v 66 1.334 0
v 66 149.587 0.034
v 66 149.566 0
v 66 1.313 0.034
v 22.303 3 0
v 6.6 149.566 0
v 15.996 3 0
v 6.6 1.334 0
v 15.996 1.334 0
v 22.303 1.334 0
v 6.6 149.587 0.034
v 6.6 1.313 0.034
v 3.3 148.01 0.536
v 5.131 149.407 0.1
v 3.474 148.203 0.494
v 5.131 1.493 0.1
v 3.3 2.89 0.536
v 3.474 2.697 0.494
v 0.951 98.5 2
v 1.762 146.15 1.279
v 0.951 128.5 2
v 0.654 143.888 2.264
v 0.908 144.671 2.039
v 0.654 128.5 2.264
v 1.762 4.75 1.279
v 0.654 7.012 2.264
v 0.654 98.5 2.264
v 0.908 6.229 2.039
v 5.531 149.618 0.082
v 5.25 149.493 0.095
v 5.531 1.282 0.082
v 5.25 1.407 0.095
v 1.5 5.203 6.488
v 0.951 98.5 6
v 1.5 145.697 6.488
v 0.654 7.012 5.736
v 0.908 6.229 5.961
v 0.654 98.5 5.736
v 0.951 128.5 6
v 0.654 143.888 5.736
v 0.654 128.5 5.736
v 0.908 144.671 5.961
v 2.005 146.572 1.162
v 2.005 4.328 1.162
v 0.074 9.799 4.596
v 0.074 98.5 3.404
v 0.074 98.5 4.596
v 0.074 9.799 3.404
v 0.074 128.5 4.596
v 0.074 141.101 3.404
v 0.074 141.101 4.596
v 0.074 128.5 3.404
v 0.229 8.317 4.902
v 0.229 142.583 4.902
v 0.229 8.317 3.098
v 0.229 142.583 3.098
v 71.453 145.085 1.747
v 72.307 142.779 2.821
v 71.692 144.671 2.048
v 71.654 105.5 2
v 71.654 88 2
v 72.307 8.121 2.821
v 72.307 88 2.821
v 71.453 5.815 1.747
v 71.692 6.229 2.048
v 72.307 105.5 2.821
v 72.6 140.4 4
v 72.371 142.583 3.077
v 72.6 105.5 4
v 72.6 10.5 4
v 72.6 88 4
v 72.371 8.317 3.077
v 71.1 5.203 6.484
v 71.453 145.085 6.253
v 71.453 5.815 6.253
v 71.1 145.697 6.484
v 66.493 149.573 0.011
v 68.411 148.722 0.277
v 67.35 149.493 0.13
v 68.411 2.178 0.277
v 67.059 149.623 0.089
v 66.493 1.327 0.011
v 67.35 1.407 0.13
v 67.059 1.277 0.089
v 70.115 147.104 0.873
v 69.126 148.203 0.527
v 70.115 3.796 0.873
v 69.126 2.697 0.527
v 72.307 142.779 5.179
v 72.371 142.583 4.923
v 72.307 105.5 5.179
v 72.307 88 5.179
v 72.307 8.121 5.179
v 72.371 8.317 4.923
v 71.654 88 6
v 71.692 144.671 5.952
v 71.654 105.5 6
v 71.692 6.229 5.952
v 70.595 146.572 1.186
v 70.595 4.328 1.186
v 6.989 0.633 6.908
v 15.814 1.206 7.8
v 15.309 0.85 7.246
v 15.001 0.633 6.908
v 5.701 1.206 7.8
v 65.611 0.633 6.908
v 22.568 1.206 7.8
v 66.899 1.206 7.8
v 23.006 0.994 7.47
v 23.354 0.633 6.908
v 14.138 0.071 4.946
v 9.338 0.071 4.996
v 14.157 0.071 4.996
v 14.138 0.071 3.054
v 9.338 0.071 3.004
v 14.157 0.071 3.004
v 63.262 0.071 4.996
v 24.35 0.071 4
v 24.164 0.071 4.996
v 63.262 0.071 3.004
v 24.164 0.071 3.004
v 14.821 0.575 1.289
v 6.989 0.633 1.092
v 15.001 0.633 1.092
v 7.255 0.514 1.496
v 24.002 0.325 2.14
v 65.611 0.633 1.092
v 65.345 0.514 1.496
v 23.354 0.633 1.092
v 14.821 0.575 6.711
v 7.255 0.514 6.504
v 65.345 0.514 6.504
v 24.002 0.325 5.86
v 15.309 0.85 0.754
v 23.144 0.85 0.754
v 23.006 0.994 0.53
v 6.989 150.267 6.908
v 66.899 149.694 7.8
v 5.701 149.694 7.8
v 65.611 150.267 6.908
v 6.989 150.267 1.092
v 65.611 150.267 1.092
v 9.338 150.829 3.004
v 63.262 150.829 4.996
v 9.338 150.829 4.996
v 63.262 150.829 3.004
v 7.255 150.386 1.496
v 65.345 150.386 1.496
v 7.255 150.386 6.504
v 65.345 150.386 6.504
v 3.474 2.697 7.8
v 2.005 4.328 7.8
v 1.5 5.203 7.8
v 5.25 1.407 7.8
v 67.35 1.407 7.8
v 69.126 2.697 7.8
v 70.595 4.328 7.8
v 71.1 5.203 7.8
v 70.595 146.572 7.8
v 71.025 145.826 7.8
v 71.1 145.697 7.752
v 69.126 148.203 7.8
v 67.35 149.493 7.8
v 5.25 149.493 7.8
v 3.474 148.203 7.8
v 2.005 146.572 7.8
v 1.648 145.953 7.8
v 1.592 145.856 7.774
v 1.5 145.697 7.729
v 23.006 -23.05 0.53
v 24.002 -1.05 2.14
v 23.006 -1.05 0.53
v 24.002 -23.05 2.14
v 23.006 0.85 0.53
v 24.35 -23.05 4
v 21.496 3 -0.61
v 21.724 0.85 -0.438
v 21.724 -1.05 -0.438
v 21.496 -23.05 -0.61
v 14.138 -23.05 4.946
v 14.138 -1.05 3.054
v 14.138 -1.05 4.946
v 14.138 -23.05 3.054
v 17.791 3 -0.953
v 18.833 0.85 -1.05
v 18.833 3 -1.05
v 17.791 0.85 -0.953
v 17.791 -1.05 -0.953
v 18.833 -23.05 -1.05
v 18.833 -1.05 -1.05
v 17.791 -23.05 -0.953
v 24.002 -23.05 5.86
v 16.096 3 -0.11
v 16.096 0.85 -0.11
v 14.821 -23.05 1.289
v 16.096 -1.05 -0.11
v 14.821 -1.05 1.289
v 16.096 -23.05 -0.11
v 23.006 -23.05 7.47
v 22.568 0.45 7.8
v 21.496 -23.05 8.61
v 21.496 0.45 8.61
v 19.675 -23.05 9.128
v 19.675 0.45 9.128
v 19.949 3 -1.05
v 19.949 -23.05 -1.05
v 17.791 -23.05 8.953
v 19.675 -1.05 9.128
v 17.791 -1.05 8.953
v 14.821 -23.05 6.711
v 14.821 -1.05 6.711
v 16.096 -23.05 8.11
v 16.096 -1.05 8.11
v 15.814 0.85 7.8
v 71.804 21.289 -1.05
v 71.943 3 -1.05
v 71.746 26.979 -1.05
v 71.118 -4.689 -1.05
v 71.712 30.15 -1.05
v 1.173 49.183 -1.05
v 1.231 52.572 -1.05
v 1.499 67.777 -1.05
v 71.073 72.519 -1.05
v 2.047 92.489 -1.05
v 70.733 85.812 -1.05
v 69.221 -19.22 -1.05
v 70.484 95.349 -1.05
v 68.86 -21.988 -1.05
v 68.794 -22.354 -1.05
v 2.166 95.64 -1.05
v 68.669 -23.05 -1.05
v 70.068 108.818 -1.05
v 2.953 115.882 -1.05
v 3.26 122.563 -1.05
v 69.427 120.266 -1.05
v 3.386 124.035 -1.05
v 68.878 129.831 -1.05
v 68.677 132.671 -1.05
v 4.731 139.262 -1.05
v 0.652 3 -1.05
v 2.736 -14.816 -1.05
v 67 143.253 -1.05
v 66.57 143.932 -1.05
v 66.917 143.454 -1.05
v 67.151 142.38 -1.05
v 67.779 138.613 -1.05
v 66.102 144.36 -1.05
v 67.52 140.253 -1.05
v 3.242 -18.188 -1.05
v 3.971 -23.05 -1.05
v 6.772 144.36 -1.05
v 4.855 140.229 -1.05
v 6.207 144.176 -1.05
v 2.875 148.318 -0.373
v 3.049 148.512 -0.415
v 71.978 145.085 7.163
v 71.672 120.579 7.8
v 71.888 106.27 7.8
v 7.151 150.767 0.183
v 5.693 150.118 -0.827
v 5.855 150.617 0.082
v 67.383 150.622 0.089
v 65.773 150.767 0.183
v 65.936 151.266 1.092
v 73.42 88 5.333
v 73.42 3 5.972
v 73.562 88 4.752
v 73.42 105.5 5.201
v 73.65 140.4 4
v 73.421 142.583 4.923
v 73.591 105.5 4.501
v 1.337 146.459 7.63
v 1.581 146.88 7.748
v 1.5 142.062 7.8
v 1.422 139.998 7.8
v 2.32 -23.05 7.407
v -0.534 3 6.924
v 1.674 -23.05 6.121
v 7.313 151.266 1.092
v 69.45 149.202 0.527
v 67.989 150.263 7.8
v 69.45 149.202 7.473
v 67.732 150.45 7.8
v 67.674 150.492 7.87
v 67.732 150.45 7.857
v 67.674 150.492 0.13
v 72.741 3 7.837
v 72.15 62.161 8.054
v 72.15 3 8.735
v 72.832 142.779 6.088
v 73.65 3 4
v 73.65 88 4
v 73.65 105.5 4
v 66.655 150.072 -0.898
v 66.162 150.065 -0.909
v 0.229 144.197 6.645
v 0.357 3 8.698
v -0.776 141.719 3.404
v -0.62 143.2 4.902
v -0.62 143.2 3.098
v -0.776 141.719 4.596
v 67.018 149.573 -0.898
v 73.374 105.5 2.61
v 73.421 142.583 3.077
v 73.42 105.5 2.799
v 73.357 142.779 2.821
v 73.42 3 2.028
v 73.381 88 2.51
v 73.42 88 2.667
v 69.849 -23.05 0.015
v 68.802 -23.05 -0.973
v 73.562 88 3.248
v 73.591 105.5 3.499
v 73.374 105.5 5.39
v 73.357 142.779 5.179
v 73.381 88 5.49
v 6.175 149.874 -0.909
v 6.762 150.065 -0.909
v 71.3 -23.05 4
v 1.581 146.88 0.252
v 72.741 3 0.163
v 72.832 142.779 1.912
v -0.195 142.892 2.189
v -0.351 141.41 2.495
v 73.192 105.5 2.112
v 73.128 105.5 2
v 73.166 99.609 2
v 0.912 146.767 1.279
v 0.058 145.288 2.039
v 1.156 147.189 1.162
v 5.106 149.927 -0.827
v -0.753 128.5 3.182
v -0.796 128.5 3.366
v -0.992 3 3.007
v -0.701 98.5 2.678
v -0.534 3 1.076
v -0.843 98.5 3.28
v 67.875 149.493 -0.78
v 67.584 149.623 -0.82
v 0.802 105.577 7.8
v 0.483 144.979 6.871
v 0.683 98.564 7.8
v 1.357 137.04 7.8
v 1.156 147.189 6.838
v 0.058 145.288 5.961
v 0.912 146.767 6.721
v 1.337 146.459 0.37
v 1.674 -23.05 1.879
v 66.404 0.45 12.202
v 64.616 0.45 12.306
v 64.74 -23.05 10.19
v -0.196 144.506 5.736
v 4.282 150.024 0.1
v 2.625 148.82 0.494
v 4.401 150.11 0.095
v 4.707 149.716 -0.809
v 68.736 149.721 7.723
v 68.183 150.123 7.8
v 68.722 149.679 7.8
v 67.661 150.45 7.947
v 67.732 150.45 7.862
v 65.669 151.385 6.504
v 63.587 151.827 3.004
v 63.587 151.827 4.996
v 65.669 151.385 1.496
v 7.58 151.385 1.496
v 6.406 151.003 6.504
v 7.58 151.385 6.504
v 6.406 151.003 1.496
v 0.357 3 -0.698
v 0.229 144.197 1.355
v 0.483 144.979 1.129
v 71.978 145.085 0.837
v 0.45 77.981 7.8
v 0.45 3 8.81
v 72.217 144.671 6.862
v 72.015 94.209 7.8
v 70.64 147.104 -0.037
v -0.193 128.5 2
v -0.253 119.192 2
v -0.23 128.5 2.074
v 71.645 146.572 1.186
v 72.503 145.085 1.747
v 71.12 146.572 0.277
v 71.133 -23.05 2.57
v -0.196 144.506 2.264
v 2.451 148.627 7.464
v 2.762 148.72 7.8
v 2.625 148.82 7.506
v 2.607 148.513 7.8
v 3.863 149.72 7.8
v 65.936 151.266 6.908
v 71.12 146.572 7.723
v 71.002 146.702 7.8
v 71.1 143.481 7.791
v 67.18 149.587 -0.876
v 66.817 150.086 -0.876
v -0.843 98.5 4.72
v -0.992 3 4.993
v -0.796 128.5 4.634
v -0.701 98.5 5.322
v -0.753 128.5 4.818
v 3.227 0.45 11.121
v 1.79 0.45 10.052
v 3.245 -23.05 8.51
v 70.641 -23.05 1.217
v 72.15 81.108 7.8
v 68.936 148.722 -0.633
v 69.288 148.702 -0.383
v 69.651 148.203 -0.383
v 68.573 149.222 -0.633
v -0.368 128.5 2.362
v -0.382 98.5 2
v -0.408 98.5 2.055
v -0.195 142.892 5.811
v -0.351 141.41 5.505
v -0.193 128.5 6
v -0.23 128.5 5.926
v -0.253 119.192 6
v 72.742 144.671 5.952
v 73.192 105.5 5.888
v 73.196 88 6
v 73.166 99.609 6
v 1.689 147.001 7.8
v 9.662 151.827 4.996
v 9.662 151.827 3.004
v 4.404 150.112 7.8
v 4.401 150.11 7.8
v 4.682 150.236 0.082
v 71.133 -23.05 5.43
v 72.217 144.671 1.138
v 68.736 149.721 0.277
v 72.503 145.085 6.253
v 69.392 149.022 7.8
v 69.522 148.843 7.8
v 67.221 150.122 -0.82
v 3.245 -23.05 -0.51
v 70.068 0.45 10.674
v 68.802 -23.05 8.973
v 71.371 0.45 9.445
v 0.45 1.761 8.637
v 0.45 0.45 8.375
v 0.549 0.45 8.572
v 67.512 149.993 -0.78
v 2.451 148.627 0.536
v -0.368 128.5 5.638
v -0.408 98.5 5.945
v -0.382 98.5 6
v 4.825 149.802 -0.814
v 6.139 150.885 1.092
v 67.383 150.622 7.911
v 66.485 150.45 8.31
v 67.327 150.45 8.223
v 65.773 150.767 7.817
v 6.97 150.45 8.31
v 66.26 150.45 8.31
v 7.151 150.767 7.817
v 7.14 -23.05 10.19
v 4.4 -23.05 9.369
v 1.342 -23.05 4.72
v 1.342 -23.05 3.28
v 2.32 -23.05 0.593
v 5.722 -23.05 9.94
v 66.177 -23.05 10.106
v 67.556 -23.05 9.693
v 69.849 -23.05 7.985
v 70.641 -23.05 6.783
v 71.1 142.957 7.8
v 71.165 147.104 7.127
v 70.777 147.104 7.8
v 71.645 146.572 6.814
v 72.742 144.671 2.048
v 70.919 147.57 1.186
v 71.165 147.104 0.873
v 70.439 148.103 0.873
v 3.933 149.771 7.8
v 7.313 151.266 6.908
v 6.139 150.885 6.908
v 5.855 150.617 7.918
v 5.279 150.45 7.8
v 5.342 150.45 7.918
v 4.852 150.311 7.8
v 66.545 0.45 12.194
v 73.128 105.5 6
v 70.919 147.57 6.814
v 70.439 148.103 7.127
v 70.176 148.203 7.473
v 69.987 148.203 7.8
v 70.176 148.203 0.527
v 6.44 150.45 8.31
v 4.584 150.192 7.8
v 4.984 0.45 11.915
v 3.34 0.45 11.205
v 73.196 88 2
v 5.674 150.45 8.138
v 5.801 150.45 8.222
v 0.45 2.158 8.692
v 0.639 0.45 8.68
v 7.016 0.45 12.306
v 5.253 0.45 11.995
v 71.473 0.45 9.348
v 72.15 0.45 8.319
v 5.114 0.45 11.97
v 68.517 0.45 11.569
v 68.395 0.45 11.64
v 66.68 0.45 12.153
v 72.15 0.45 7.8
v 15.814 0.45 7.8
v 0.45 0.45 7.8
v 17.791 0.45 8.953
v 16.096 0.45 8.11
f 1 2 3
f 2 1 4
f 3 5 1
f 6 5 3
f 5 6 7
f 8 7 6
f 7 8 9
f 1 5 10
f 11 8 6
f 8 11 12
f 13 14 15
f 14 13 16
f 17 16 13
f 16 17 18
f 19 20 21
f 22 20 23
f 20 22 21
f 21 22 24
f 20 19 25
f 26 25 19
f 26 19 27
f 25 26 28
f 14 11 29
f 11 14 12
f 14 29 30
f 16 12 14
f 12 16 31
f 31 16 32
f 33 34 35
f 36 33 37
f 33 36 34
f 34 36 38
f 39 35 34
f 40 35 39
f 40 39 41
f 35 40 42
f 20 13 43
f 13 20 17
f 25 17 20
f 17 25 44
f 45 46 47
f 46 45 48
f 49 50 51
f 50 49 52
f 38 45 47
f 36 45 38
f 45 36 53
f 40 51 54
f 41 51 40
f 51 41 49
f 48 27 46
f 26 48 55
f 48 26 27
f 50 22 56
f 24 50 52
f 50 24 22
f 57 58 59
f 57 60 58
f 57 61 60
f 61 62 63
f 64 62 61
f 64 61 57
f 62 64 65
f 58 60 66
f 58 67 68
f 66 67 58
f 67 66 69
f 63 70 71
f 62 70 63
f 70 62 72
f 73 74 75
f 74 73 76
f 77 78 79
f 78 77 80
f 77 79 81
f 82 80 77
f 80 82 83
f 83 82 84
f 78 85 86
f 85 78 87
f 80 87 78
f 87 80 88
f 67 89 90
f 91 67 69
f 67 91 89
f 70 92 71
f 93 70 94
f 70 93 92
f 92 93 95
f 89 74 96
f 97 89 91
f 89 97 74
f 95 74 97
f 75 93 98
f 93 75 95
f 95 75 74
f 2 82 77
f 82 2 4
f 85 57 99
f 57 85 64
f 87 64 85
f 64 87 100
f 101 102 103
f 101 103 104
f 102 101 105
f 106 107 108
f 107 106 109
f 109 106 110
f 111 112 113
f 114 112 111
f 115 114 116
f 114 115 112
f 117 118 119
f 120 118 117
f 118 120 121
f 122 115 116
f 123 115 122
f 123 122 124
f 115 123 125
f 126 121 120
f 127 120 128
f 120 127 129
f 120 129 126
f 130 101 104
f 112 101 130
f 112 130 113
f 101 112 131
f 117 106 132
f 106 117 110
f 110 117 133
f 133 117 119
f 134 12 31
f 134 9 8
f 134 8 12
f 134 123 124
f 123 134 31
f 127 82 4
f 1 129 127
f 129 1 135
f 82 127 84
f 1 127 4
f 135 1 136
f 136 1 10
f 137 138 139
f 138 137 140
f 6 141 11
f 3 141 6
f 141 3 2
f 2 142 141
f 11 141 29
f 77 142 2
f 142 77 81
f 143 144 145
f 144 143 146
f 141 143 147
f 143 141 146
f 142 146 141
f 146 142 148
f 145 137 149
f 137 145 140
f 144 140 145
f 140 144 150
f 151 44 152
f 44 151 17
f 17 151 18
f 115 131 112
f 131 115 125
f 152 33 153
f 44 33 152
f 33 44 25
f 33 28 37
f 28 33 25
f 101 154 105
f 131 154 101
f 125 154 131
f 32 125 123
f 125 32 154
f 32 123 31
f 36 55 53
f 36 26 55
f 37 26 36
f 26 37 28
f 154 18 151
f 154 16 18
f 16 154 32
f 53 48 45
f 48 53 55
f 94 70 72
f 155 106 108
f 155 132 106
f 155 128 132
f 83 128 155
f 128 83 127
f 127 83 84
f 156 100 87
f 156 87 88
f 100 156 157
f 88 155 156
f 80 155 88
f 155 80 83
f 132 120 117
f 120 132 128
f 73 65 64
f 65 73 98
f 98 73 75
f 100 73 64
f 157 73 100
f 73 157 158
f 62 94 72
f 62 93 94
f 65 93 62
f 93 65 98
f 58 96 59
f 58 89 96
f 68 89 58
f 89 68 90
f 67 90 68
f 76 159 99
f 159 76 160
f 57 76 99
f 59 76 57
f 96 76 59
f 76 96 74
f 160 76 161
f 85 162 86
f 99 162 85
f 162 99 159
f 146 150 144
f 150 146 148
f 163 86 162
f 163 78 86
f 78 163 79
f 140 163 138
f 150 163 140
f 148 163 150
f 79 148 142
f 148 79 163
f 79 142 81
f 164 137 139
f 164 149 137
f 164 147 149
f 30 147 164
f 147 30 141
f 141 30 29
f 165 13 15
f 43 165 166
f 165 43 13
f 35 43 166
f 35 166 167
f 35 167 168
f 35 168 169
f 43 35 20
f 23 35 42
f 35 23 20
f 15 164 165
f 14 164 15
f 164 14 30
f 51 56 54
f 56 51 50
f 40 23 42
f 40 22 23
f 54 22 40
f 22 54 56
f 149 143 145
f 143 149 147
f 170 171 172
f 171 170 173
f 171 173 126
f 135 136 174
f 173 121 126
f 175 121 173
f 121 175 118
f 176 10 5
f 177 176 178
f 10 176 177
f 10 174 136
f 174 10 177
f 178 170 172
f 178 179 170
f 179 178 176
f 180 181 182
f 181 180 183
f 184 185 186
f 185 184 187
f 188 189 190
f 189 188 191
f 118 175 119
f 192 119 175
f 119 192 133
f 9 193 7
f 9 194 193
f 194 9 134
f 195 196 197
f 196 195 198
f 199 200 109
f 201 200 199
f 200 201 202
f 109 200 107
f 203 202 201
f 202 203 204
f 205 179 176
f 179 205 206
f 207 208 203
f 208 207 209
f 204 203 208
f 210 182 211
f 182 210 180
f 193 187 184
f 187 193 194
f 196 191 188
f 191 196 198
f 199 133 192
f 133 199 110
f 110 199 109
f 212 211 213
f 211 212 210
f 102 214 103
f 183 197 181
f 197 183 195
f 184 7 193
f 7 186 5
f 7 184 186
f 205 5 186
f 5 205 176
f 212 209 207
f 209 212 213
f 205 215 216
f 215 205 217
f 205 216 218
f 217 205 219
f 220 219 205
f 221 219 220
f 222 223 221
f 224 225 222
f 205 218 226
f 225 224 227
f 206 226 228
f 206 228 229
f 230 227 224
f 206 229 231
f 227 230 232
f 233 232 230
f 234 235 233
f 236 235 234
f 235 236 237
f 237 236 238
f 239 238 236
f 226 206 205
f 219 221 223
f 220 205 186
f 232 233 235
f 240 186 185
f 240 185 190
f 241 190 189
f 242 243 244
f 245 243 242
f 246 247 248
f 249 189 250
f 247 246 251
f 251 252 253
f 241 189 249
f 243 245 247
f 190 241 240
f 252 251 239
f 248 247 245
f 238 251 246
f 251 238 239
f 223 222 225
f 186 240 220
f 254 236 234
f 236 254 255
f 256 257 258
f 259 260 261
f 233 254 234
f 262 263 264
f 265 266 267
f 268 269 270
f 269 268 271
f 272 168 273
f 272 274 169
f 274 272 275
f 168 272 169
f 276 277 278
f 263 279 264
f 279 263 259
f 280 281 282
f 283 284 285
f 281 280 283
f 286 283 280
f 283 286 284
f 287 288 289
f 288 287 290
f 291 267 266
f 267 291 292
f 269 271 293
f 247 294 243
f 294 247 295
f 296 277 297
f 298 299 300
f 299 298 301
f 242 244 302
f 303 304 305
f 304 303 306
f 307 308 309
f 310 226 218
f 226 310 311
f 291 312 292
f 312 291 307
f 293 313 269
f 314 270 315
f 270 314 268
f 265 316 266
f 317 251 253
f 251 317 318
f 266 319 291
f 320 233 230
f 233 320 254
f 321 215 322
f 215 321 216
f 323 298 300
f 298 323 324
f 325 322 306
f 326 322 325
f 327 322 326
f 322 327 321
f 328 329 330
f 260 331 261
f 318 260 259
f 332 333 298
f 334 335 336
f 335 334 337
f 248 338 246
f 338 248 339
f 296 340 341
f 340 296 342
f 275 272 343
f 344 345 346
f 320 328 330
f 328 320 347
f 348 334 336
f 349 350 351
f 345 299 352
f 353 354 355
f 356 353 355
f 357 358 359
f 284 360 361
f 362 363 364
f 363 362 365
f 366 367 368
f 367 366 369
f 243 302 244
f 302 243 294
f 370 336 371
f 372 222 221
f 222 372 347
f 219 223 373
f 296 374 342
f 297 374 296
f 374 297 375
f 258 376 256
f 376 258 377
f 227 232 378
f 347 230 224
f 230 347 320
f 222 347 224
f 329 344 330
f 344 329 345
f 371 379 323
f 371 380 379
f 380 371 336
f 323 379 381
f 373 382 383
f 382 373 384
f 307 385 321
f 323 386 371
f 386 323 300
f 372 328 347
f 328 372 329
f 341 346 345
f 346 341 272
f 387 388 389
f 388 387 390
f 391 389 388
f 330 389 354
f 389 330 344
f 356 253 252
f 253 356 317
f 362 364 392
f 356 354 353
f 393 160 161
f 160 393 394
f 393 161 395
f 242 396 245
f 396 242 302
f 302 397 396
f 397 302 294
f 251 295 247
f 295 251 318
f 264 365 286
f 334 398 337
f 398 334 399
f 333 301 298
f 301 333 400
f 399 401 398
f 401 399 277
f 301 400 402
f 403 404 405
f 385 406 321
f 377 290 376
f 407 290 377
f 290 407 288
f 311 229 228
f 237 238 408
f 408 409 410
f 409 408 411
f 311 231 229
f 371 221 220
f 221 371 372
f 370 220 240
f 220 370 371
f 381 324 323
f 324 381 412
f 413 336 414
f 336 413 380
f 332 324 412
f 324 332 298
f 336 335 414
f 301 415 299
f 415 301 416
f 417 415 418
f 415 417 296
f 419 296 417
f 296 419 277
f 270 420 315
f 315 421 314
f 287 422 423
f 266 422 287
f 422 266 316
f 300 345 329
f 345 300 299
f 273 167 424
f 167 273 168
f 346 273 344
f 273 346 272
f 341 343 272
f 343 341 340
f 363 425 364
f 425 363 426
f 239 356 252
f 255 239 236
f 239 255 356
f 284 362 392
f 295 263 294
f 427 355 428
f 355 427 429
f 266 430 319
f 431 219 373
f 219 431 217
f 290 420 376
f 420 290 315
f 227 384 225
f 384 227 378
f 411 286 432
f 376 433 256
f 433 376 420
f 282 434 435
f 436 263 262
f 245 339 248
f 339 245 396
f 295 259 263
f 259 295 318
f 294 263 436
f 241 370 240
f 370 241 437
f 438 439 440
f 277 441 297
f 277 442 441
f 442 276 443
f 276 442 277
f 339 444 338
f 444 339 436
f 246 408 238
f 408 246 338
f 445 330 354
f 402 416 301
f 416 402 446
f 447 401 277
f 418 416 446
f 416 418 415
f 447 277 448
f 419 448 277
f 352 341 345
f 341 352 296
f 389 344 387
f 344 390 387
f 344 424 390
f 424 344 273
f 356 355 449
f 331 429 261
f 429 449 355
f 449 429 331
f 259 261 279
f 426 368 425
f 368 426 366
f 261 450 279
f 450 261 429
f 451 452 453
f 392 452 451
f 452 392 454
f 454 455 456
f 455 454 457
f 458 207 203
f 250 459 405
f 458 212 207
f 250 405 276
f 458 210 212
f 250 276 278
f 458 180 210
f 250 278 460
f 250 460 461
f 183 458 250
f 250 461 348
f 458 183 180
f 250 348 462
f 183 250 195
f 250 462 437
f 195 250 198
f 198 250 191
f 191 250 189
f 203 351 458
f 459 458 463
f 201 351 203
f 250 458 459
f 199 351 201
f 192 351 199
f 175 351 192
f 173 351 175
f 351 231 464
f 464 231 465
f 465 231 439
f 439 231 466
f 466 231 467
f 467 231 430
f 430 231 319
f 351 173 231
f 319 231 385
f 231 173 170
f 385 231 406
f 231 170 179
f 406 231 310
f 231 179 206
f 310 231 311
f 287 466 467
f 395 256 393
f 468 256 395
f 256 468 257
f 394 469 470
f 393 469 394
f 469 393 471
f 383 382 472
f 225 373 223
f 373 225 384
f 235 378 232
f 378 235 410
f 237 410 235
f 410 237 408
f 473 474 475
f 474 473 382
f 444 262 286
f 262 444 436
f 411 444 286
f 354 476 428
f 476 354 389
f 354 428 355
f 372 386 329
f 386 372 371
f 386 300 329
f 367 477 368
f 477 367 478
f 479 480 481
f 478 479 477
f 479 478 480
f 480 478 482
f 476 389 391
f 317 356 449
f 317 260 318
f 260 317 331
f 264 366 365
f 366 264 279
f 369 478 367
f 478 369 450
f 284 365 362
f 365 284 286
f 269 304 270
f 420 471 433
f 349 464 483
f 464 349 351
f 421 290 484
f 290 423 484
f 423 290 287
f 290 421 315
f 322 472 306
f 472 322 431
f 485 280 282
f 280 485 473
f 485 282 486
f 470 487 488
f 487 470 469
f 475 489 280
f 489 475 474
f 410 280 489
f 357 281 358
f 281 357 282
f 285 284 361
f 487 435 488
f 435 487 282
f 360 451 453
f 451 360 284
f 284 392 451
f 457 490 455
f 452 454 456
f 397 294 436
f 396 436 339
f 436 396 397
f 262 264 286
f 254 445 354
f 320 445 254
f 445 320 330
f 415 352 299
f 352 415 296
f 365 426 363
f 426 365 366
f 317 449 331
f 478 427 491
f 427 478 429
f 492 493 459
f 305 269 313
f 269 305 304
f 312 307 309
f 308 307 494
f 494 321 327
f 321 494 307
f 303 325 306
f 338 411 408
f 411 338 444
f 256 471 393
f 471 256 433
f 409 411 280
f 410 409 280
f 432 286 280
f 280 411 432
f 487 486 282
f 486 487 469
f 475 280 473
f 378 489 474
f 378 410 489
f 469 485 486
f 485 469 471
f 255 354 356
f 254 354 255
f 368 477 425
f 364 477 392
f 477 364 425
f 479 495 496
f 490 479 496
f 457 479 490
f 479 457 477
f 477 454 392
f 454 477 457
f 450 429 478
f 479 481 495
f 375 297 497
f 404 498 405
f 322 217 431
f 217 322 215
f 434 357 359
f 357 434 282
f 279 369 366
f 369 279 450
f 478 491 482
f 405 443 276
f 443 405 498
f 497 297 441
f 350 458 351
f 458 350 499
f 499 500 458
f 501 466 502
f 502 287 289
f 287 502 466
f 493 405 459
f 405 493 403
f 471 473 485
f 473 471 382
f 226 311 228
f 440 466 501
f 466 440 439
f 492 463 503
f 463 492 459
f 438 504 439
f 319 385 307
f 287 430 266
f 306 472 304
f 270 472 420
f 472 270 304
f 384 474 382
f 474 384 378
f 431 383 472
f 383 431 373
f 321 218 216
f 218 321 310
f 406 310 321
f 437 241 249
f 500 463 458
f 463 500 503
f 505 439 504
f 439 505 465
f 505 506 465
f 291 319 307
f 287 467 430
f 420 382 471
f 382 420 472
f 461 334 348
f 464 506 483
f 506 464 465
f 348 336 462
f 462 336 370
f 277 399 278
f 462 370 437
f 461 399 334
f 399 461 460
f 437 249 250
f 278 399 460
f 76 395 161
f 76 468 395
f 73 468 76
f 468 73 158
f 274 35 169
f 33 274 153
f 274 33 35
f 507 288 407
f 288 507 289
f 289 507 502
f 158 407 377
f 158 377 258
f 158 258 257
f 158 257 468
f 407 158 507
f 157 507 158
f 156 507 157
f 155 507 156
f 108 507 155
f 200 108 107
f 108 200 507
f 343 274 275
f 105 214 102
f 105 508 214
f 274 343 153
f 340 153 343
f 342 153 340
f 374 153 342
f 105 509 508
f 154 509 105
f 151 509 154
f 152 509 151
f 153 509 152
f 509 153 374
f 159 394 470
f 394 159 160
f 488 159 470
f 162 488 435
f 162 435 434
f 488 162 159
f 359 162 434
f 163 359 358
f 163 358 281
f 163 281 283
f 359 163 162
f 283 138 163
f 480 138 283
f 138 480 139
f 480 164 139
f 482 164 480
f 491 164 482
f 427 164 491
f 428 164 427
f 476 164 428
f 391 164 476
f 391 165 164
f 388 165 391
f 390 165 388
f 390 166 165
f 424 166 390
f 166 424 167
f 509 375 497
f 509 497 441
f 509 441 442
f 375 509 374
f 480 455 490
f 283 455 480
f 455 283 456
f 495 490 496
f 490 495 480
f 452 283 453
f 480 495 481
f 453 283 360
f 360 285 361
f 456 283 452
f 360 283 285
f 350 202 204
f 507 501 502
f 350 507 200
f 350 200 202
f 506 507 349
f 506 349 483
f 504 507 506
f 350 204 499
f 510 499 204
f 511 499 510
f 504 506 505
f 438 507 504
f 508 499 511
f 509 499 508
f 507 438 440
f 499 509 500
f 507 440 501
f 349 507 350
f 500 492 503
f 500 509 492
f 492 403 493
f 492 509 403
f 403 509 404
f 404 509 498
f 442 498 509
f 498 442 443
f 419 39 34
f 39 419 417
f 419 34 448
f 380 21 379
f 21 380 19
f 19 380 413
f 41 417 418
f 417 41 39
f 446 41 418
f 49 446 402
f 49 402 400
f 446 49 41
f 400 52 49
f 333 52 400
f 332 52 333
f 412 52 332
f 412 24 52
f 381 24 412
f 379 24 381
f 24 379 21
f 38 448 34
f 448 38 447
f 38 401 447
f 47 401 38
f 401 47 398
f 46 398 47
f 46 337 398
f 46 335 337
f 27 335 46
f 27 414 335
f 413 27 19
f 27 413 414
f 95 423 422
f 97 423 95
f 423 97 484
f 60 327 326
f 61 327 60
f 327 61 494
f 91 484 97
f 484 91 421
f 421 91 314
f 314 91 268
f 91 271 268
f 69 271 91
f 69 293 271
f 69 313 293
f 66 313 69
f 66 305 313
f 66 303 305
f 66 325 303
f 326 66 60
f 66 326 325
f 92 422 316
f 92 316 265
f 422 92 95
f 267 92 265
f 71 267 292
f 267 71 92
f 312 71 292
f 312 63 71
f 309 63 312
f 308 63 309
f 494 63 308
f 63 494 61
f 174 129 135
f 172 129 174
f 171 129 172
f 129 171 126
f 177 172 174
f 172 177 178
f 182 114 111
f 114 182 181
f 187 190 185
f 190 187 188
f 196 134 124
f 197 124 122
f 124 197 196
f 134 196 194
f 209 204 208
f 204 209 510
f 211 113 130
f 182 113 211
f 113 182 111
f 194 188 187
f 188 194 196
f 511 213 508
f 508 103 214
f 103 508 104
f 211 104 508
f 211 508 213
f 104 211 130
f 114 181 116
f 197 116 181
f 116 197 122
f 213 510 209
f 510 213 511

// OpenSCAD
//My phone cover and reinforcement for the headphone jack.

//Measurements of Samsung Galaxy 7 Edge
phone_width = 72.6;
phone_height = 150.9;
phone_depth = 8.0;

phone_roundness_h = 6.6; //How far in the X direction the roundness extends over the screen.
phone_roundness_v_radius = 7.0; //The vertical roundness is not exactly round. Eccentricity!
phone_roundness_corner = 10.5; //Radius of the four rounded corners.

button_volumes_y = 98.5;
button_volumes_height = 30.0;
button_volumes_depth = 4.0;
button_power_y = 88.0;
button_power_height = 17.5;
button_power_depth = 4.0;

jack_x = 19.2; //Position of centre!
jack_width = 10.3;
jack_sleeve_diameter = 10.3; //Allow 0.3mm more for inaccuracy in printing.
jack_sleeve_length = 22.0; //How long the tube for the jack is.

//Settings
thickness = 1.05; //Align to line width for best print results.
undercut = 0.2; //How far below the phone's surface the mesh will stay.
max_overhang = 1.5; //How much the lip of the cover is allowed to overhang (barring undercut).
jack_sleeve_overhang = 3; //How far the sleeve covers the phone. Needs to be at least so that it covers the v_radius component!
jack_sleeve_diameter2 = 15; //Make it thicker at the base for strength.
jack_sleeve_endstop_length = 3; //Make the sleeve slope back down to disappear in the object.

//Implementation.
module body() {
	intersection() {
		union() { //Main body with rounded corners left and right.
			translate([phone_roundness_h, 0, 0]) {
				cube([phone_width - phone_roundness_h * 2, phone_height, phone_depth]);
			}
			translate([phone_roundness_h, 0, phone_depth / 2]) {
				scale([1, 1, (phone_depth / 2) / phone_roundness_h]) {
					rotate([-90, 0, 0]) {
						cylinder(r=phone_roundness_h, h=phone_height);
					}
				}
			}
			translate([phone_width - phone_roundness_h, 0, phone_depth / 2]) {
				scale([1, 1, (phone_depth / 2) / phone_roundness_h]) {
					rotate([-90, 0, 0]) {
						cylinder(r=phone_roundness_h, h=phone_height);
					}
				}
			}
		}
		union() { //Filter to cause vertical roundness.
			translate([0, phone_roundness_v_radius, phone_depth / 2]) {
				rotate([0, 90, 0]) {
					cylinder(r=phone_roundness_v_radius, h=phone_width);
				}
			}
			translate([0, phone_height - phone_roundness_v_radius, phone_depth / 2]) {
				rotate([0, 90, 0]) {
					cylinder(r=phone_roundness_v_radius, h=phone_width);
				}
			}
			translate([0, phone_roundness_v_radius, phone_depth / 2 - phone_roundness_v_radius]) {
				cube([phone_width, phone_height - phone_roundness_v_radius * 2, phone_roundness_v_radius * 2]);
			}
		}
		union() { //Filter to cause four rounded corners.
			translate([phone_roundness_corner, phone_roundness_corner, 0]) {
				cylinder(r=phone_roundness_corner, h=phone_depth);
			}
			translate([phone_width - phone_roundness_corner, phone_roundness_corner, 0]) {
				cylinder(r=phone_roundness_corner, h=phone_depth);
			}
			translate([phone_width - phone_roundness_corner, phone_height - phone_roundness_corner, 0]) {
				cylinder(r=phone_roundness_corner, h=phone_depth);
			}
			translate([phone_roundness_corner, phone_height - phone_roundness_corner, 0]) {
				cylinder(r=phone_roundness_corner, h=phone_depth);
			}
			translate([phone_roundness_corner, 0, 0]) {
				cube([phone_width - phone_roundness_corner * 2, phone_height, phone_depth]);
			}
			translate([0, phone_roundness_corner, 0]) {
				cube([phone_width, phone_height - phone_roundness_corner * 2, phone_depth]);
			}
		}
	}
}

//Render the main shell.
difference() {
	difference() {
		hull() {
			minkowski() {
				body();
				sphere(r=thickness);
			}

			//Bottom side bump.
			translate([jack_sleeve_diameter2 / 2, -thickness - jack_sleeve_length, phone_depth / 2]) {
				rotate([-90, 0, 0]) {
					cylinder(r1=jack_sleeve_diameter / 2 + thickness, r2=jack_sleeve_diameter2 / 2 + thickness, h=jack_sleeve_length + jack_sleeve_overhang + thickness);
					translate([0, 0, jack_sleeve_length + jack_sleeve_overhang + thickness]) {
						cylinder(r1=jack_sleeve_diameter2 / 2 + thickness, r2=phone_depth / 2, h=jack_sleeve_endstop_length);
					}
				}
			}
			translate([phone_width - jack_sleeve_diameter2 / 2, -thickness - jack_sleeve_length, phone_depth / 2]) {
				rotate([-90, 0, 0]) {
					cylinder(r1=jack_sleeve_diameter / 2 + thickness, r2=jack_sleeve_diameter2 / 2 + thickness, h=jack_sleeve_length + jack_sleeve_overhang + thickness);
					translate([0, 0, jack_sleeve_length + jack_sleeve_overhang + thickness]) {
						cylinder(r1=jack_sleeve_diameter2 / 2 + thickness, r2=phone_depth / 2, h=jack_sleeve_endstop_length);
					}
				}
			}
		}
		translate([jack_x, -thickness - jack_sleeve_length, phone_depth / 2]) {
			rotate([-90, 0, 0]) {
				cylinder(r=jack_sleeve_diameter / 2, h=jack_sleeve_length + jack_sleeve_overhang + thickness);
				translate([-jack_sleeve_diameter2 / 2 - thickness, phone_depth / 2 + thickness, 0]) {
					cube([jack_sleeve_diameter2, jack_sleeve_diameter2, jack_sleeve_length + jack_sleeve_endstop_length * 2 + thickness]);
				}
			}
		}
	}
	body(); //Hollow out!

	//Remove top cover.
	inset = min(sqrt(1 - pow((phone_depth / 2 - undercut) / phone_roundness_v_radius, 2)) * phone_roundness_v_radius / (phone_depth / 2 - undercut), max_overhang); //cos(sin-1(h)) = sqrt(1 - h^2)
	translate([-thickness + inset, -thickness + inset, phone_depth - undercut]) {
		cube([phone_width + thickness * 2 - inset * 2, phone_height + thickness * 2 - inset * 2, jack_sleeve_diameter2]);
	}

	//Apply maximum overhang.
	intersection() {
		union() {
			translate([phone_roundness_corner, phone_roundness_corner, phone_depth / 2]) {
				cylinder(r=phone_roundness_corner, h=phone_depth / 2);
			}
			translate([phone_width - phone_roundness_corner, phone_roundness_corner, phone_depth / 2]) {
				cylinder(r=phone_roundness_corner, h=phone_depth / 2);
			}
			translate([phone_width - phone_roundness_corner, phone_height - phone_roundness_corner, phone_depth / 2]) {
				cylinder(r=phone_roundness_corner, h=phone_depth / 2);
			}
			translate([phone_roundness_corner, phone_height - phone_roundness_corner, phone_depth / 2]) {
				cylinder(r=phone_roundness_corner, h=phone_depth / 2);
			}
			translate([phone_roundness_corner, 0, phone_depth / 2]) {
				cube([phone_width - phone_roundness_corner * 2, phone_height, phone_depth / 2]);
			}
			translate([0, phone_roundness_corner, phone_depth / 2]) {
				cube([phone_width, phone_height - phone_roundness_corner * 2, phone_depth / 2]);
			}
		}
		translate([max_overhang, max_overhang, phone_depth / 2]) {
			cube([phone_width - max_overhang * 2, phone_height - max_overhang * 2, phone_depth / 2]);
		}
	}

	//Subtract holes for buttons, peripherals, etc.
	//Volume buttons.
	translate([-thickness, button_volumes_y, phone_depth / 2 - button_volumes_depth / 2]) {
		cube([thickness + phone_roundness_h, button_volumes_height, button_volumes_depth]);
	}
	//Power button.
	translate([phone_width - phone_roundness_h, button_power_y, phone_depth / 2 - button_power_depth / 2]) {
		cube([thickness + phone_roundness_h, button_power_height, button_power_depth]);
	}
	//Audio jack.
	translate([jack_x, -thickness, phone_depth / 2]) {
		rotate([-90, 0, 0]) {
			cylinder(r=jack_width / 2, h=inset + 0.4);
		}
	}

	//Due to rounding errors in sqrt() and pow() calls, we need to flatten the bottom again properly.
	translate([-phone_width, -phone_height, -phone_depth - thickness]) {
		cube([phone_width * 3, phone_height * 3, phone_depth]);
	}
}
